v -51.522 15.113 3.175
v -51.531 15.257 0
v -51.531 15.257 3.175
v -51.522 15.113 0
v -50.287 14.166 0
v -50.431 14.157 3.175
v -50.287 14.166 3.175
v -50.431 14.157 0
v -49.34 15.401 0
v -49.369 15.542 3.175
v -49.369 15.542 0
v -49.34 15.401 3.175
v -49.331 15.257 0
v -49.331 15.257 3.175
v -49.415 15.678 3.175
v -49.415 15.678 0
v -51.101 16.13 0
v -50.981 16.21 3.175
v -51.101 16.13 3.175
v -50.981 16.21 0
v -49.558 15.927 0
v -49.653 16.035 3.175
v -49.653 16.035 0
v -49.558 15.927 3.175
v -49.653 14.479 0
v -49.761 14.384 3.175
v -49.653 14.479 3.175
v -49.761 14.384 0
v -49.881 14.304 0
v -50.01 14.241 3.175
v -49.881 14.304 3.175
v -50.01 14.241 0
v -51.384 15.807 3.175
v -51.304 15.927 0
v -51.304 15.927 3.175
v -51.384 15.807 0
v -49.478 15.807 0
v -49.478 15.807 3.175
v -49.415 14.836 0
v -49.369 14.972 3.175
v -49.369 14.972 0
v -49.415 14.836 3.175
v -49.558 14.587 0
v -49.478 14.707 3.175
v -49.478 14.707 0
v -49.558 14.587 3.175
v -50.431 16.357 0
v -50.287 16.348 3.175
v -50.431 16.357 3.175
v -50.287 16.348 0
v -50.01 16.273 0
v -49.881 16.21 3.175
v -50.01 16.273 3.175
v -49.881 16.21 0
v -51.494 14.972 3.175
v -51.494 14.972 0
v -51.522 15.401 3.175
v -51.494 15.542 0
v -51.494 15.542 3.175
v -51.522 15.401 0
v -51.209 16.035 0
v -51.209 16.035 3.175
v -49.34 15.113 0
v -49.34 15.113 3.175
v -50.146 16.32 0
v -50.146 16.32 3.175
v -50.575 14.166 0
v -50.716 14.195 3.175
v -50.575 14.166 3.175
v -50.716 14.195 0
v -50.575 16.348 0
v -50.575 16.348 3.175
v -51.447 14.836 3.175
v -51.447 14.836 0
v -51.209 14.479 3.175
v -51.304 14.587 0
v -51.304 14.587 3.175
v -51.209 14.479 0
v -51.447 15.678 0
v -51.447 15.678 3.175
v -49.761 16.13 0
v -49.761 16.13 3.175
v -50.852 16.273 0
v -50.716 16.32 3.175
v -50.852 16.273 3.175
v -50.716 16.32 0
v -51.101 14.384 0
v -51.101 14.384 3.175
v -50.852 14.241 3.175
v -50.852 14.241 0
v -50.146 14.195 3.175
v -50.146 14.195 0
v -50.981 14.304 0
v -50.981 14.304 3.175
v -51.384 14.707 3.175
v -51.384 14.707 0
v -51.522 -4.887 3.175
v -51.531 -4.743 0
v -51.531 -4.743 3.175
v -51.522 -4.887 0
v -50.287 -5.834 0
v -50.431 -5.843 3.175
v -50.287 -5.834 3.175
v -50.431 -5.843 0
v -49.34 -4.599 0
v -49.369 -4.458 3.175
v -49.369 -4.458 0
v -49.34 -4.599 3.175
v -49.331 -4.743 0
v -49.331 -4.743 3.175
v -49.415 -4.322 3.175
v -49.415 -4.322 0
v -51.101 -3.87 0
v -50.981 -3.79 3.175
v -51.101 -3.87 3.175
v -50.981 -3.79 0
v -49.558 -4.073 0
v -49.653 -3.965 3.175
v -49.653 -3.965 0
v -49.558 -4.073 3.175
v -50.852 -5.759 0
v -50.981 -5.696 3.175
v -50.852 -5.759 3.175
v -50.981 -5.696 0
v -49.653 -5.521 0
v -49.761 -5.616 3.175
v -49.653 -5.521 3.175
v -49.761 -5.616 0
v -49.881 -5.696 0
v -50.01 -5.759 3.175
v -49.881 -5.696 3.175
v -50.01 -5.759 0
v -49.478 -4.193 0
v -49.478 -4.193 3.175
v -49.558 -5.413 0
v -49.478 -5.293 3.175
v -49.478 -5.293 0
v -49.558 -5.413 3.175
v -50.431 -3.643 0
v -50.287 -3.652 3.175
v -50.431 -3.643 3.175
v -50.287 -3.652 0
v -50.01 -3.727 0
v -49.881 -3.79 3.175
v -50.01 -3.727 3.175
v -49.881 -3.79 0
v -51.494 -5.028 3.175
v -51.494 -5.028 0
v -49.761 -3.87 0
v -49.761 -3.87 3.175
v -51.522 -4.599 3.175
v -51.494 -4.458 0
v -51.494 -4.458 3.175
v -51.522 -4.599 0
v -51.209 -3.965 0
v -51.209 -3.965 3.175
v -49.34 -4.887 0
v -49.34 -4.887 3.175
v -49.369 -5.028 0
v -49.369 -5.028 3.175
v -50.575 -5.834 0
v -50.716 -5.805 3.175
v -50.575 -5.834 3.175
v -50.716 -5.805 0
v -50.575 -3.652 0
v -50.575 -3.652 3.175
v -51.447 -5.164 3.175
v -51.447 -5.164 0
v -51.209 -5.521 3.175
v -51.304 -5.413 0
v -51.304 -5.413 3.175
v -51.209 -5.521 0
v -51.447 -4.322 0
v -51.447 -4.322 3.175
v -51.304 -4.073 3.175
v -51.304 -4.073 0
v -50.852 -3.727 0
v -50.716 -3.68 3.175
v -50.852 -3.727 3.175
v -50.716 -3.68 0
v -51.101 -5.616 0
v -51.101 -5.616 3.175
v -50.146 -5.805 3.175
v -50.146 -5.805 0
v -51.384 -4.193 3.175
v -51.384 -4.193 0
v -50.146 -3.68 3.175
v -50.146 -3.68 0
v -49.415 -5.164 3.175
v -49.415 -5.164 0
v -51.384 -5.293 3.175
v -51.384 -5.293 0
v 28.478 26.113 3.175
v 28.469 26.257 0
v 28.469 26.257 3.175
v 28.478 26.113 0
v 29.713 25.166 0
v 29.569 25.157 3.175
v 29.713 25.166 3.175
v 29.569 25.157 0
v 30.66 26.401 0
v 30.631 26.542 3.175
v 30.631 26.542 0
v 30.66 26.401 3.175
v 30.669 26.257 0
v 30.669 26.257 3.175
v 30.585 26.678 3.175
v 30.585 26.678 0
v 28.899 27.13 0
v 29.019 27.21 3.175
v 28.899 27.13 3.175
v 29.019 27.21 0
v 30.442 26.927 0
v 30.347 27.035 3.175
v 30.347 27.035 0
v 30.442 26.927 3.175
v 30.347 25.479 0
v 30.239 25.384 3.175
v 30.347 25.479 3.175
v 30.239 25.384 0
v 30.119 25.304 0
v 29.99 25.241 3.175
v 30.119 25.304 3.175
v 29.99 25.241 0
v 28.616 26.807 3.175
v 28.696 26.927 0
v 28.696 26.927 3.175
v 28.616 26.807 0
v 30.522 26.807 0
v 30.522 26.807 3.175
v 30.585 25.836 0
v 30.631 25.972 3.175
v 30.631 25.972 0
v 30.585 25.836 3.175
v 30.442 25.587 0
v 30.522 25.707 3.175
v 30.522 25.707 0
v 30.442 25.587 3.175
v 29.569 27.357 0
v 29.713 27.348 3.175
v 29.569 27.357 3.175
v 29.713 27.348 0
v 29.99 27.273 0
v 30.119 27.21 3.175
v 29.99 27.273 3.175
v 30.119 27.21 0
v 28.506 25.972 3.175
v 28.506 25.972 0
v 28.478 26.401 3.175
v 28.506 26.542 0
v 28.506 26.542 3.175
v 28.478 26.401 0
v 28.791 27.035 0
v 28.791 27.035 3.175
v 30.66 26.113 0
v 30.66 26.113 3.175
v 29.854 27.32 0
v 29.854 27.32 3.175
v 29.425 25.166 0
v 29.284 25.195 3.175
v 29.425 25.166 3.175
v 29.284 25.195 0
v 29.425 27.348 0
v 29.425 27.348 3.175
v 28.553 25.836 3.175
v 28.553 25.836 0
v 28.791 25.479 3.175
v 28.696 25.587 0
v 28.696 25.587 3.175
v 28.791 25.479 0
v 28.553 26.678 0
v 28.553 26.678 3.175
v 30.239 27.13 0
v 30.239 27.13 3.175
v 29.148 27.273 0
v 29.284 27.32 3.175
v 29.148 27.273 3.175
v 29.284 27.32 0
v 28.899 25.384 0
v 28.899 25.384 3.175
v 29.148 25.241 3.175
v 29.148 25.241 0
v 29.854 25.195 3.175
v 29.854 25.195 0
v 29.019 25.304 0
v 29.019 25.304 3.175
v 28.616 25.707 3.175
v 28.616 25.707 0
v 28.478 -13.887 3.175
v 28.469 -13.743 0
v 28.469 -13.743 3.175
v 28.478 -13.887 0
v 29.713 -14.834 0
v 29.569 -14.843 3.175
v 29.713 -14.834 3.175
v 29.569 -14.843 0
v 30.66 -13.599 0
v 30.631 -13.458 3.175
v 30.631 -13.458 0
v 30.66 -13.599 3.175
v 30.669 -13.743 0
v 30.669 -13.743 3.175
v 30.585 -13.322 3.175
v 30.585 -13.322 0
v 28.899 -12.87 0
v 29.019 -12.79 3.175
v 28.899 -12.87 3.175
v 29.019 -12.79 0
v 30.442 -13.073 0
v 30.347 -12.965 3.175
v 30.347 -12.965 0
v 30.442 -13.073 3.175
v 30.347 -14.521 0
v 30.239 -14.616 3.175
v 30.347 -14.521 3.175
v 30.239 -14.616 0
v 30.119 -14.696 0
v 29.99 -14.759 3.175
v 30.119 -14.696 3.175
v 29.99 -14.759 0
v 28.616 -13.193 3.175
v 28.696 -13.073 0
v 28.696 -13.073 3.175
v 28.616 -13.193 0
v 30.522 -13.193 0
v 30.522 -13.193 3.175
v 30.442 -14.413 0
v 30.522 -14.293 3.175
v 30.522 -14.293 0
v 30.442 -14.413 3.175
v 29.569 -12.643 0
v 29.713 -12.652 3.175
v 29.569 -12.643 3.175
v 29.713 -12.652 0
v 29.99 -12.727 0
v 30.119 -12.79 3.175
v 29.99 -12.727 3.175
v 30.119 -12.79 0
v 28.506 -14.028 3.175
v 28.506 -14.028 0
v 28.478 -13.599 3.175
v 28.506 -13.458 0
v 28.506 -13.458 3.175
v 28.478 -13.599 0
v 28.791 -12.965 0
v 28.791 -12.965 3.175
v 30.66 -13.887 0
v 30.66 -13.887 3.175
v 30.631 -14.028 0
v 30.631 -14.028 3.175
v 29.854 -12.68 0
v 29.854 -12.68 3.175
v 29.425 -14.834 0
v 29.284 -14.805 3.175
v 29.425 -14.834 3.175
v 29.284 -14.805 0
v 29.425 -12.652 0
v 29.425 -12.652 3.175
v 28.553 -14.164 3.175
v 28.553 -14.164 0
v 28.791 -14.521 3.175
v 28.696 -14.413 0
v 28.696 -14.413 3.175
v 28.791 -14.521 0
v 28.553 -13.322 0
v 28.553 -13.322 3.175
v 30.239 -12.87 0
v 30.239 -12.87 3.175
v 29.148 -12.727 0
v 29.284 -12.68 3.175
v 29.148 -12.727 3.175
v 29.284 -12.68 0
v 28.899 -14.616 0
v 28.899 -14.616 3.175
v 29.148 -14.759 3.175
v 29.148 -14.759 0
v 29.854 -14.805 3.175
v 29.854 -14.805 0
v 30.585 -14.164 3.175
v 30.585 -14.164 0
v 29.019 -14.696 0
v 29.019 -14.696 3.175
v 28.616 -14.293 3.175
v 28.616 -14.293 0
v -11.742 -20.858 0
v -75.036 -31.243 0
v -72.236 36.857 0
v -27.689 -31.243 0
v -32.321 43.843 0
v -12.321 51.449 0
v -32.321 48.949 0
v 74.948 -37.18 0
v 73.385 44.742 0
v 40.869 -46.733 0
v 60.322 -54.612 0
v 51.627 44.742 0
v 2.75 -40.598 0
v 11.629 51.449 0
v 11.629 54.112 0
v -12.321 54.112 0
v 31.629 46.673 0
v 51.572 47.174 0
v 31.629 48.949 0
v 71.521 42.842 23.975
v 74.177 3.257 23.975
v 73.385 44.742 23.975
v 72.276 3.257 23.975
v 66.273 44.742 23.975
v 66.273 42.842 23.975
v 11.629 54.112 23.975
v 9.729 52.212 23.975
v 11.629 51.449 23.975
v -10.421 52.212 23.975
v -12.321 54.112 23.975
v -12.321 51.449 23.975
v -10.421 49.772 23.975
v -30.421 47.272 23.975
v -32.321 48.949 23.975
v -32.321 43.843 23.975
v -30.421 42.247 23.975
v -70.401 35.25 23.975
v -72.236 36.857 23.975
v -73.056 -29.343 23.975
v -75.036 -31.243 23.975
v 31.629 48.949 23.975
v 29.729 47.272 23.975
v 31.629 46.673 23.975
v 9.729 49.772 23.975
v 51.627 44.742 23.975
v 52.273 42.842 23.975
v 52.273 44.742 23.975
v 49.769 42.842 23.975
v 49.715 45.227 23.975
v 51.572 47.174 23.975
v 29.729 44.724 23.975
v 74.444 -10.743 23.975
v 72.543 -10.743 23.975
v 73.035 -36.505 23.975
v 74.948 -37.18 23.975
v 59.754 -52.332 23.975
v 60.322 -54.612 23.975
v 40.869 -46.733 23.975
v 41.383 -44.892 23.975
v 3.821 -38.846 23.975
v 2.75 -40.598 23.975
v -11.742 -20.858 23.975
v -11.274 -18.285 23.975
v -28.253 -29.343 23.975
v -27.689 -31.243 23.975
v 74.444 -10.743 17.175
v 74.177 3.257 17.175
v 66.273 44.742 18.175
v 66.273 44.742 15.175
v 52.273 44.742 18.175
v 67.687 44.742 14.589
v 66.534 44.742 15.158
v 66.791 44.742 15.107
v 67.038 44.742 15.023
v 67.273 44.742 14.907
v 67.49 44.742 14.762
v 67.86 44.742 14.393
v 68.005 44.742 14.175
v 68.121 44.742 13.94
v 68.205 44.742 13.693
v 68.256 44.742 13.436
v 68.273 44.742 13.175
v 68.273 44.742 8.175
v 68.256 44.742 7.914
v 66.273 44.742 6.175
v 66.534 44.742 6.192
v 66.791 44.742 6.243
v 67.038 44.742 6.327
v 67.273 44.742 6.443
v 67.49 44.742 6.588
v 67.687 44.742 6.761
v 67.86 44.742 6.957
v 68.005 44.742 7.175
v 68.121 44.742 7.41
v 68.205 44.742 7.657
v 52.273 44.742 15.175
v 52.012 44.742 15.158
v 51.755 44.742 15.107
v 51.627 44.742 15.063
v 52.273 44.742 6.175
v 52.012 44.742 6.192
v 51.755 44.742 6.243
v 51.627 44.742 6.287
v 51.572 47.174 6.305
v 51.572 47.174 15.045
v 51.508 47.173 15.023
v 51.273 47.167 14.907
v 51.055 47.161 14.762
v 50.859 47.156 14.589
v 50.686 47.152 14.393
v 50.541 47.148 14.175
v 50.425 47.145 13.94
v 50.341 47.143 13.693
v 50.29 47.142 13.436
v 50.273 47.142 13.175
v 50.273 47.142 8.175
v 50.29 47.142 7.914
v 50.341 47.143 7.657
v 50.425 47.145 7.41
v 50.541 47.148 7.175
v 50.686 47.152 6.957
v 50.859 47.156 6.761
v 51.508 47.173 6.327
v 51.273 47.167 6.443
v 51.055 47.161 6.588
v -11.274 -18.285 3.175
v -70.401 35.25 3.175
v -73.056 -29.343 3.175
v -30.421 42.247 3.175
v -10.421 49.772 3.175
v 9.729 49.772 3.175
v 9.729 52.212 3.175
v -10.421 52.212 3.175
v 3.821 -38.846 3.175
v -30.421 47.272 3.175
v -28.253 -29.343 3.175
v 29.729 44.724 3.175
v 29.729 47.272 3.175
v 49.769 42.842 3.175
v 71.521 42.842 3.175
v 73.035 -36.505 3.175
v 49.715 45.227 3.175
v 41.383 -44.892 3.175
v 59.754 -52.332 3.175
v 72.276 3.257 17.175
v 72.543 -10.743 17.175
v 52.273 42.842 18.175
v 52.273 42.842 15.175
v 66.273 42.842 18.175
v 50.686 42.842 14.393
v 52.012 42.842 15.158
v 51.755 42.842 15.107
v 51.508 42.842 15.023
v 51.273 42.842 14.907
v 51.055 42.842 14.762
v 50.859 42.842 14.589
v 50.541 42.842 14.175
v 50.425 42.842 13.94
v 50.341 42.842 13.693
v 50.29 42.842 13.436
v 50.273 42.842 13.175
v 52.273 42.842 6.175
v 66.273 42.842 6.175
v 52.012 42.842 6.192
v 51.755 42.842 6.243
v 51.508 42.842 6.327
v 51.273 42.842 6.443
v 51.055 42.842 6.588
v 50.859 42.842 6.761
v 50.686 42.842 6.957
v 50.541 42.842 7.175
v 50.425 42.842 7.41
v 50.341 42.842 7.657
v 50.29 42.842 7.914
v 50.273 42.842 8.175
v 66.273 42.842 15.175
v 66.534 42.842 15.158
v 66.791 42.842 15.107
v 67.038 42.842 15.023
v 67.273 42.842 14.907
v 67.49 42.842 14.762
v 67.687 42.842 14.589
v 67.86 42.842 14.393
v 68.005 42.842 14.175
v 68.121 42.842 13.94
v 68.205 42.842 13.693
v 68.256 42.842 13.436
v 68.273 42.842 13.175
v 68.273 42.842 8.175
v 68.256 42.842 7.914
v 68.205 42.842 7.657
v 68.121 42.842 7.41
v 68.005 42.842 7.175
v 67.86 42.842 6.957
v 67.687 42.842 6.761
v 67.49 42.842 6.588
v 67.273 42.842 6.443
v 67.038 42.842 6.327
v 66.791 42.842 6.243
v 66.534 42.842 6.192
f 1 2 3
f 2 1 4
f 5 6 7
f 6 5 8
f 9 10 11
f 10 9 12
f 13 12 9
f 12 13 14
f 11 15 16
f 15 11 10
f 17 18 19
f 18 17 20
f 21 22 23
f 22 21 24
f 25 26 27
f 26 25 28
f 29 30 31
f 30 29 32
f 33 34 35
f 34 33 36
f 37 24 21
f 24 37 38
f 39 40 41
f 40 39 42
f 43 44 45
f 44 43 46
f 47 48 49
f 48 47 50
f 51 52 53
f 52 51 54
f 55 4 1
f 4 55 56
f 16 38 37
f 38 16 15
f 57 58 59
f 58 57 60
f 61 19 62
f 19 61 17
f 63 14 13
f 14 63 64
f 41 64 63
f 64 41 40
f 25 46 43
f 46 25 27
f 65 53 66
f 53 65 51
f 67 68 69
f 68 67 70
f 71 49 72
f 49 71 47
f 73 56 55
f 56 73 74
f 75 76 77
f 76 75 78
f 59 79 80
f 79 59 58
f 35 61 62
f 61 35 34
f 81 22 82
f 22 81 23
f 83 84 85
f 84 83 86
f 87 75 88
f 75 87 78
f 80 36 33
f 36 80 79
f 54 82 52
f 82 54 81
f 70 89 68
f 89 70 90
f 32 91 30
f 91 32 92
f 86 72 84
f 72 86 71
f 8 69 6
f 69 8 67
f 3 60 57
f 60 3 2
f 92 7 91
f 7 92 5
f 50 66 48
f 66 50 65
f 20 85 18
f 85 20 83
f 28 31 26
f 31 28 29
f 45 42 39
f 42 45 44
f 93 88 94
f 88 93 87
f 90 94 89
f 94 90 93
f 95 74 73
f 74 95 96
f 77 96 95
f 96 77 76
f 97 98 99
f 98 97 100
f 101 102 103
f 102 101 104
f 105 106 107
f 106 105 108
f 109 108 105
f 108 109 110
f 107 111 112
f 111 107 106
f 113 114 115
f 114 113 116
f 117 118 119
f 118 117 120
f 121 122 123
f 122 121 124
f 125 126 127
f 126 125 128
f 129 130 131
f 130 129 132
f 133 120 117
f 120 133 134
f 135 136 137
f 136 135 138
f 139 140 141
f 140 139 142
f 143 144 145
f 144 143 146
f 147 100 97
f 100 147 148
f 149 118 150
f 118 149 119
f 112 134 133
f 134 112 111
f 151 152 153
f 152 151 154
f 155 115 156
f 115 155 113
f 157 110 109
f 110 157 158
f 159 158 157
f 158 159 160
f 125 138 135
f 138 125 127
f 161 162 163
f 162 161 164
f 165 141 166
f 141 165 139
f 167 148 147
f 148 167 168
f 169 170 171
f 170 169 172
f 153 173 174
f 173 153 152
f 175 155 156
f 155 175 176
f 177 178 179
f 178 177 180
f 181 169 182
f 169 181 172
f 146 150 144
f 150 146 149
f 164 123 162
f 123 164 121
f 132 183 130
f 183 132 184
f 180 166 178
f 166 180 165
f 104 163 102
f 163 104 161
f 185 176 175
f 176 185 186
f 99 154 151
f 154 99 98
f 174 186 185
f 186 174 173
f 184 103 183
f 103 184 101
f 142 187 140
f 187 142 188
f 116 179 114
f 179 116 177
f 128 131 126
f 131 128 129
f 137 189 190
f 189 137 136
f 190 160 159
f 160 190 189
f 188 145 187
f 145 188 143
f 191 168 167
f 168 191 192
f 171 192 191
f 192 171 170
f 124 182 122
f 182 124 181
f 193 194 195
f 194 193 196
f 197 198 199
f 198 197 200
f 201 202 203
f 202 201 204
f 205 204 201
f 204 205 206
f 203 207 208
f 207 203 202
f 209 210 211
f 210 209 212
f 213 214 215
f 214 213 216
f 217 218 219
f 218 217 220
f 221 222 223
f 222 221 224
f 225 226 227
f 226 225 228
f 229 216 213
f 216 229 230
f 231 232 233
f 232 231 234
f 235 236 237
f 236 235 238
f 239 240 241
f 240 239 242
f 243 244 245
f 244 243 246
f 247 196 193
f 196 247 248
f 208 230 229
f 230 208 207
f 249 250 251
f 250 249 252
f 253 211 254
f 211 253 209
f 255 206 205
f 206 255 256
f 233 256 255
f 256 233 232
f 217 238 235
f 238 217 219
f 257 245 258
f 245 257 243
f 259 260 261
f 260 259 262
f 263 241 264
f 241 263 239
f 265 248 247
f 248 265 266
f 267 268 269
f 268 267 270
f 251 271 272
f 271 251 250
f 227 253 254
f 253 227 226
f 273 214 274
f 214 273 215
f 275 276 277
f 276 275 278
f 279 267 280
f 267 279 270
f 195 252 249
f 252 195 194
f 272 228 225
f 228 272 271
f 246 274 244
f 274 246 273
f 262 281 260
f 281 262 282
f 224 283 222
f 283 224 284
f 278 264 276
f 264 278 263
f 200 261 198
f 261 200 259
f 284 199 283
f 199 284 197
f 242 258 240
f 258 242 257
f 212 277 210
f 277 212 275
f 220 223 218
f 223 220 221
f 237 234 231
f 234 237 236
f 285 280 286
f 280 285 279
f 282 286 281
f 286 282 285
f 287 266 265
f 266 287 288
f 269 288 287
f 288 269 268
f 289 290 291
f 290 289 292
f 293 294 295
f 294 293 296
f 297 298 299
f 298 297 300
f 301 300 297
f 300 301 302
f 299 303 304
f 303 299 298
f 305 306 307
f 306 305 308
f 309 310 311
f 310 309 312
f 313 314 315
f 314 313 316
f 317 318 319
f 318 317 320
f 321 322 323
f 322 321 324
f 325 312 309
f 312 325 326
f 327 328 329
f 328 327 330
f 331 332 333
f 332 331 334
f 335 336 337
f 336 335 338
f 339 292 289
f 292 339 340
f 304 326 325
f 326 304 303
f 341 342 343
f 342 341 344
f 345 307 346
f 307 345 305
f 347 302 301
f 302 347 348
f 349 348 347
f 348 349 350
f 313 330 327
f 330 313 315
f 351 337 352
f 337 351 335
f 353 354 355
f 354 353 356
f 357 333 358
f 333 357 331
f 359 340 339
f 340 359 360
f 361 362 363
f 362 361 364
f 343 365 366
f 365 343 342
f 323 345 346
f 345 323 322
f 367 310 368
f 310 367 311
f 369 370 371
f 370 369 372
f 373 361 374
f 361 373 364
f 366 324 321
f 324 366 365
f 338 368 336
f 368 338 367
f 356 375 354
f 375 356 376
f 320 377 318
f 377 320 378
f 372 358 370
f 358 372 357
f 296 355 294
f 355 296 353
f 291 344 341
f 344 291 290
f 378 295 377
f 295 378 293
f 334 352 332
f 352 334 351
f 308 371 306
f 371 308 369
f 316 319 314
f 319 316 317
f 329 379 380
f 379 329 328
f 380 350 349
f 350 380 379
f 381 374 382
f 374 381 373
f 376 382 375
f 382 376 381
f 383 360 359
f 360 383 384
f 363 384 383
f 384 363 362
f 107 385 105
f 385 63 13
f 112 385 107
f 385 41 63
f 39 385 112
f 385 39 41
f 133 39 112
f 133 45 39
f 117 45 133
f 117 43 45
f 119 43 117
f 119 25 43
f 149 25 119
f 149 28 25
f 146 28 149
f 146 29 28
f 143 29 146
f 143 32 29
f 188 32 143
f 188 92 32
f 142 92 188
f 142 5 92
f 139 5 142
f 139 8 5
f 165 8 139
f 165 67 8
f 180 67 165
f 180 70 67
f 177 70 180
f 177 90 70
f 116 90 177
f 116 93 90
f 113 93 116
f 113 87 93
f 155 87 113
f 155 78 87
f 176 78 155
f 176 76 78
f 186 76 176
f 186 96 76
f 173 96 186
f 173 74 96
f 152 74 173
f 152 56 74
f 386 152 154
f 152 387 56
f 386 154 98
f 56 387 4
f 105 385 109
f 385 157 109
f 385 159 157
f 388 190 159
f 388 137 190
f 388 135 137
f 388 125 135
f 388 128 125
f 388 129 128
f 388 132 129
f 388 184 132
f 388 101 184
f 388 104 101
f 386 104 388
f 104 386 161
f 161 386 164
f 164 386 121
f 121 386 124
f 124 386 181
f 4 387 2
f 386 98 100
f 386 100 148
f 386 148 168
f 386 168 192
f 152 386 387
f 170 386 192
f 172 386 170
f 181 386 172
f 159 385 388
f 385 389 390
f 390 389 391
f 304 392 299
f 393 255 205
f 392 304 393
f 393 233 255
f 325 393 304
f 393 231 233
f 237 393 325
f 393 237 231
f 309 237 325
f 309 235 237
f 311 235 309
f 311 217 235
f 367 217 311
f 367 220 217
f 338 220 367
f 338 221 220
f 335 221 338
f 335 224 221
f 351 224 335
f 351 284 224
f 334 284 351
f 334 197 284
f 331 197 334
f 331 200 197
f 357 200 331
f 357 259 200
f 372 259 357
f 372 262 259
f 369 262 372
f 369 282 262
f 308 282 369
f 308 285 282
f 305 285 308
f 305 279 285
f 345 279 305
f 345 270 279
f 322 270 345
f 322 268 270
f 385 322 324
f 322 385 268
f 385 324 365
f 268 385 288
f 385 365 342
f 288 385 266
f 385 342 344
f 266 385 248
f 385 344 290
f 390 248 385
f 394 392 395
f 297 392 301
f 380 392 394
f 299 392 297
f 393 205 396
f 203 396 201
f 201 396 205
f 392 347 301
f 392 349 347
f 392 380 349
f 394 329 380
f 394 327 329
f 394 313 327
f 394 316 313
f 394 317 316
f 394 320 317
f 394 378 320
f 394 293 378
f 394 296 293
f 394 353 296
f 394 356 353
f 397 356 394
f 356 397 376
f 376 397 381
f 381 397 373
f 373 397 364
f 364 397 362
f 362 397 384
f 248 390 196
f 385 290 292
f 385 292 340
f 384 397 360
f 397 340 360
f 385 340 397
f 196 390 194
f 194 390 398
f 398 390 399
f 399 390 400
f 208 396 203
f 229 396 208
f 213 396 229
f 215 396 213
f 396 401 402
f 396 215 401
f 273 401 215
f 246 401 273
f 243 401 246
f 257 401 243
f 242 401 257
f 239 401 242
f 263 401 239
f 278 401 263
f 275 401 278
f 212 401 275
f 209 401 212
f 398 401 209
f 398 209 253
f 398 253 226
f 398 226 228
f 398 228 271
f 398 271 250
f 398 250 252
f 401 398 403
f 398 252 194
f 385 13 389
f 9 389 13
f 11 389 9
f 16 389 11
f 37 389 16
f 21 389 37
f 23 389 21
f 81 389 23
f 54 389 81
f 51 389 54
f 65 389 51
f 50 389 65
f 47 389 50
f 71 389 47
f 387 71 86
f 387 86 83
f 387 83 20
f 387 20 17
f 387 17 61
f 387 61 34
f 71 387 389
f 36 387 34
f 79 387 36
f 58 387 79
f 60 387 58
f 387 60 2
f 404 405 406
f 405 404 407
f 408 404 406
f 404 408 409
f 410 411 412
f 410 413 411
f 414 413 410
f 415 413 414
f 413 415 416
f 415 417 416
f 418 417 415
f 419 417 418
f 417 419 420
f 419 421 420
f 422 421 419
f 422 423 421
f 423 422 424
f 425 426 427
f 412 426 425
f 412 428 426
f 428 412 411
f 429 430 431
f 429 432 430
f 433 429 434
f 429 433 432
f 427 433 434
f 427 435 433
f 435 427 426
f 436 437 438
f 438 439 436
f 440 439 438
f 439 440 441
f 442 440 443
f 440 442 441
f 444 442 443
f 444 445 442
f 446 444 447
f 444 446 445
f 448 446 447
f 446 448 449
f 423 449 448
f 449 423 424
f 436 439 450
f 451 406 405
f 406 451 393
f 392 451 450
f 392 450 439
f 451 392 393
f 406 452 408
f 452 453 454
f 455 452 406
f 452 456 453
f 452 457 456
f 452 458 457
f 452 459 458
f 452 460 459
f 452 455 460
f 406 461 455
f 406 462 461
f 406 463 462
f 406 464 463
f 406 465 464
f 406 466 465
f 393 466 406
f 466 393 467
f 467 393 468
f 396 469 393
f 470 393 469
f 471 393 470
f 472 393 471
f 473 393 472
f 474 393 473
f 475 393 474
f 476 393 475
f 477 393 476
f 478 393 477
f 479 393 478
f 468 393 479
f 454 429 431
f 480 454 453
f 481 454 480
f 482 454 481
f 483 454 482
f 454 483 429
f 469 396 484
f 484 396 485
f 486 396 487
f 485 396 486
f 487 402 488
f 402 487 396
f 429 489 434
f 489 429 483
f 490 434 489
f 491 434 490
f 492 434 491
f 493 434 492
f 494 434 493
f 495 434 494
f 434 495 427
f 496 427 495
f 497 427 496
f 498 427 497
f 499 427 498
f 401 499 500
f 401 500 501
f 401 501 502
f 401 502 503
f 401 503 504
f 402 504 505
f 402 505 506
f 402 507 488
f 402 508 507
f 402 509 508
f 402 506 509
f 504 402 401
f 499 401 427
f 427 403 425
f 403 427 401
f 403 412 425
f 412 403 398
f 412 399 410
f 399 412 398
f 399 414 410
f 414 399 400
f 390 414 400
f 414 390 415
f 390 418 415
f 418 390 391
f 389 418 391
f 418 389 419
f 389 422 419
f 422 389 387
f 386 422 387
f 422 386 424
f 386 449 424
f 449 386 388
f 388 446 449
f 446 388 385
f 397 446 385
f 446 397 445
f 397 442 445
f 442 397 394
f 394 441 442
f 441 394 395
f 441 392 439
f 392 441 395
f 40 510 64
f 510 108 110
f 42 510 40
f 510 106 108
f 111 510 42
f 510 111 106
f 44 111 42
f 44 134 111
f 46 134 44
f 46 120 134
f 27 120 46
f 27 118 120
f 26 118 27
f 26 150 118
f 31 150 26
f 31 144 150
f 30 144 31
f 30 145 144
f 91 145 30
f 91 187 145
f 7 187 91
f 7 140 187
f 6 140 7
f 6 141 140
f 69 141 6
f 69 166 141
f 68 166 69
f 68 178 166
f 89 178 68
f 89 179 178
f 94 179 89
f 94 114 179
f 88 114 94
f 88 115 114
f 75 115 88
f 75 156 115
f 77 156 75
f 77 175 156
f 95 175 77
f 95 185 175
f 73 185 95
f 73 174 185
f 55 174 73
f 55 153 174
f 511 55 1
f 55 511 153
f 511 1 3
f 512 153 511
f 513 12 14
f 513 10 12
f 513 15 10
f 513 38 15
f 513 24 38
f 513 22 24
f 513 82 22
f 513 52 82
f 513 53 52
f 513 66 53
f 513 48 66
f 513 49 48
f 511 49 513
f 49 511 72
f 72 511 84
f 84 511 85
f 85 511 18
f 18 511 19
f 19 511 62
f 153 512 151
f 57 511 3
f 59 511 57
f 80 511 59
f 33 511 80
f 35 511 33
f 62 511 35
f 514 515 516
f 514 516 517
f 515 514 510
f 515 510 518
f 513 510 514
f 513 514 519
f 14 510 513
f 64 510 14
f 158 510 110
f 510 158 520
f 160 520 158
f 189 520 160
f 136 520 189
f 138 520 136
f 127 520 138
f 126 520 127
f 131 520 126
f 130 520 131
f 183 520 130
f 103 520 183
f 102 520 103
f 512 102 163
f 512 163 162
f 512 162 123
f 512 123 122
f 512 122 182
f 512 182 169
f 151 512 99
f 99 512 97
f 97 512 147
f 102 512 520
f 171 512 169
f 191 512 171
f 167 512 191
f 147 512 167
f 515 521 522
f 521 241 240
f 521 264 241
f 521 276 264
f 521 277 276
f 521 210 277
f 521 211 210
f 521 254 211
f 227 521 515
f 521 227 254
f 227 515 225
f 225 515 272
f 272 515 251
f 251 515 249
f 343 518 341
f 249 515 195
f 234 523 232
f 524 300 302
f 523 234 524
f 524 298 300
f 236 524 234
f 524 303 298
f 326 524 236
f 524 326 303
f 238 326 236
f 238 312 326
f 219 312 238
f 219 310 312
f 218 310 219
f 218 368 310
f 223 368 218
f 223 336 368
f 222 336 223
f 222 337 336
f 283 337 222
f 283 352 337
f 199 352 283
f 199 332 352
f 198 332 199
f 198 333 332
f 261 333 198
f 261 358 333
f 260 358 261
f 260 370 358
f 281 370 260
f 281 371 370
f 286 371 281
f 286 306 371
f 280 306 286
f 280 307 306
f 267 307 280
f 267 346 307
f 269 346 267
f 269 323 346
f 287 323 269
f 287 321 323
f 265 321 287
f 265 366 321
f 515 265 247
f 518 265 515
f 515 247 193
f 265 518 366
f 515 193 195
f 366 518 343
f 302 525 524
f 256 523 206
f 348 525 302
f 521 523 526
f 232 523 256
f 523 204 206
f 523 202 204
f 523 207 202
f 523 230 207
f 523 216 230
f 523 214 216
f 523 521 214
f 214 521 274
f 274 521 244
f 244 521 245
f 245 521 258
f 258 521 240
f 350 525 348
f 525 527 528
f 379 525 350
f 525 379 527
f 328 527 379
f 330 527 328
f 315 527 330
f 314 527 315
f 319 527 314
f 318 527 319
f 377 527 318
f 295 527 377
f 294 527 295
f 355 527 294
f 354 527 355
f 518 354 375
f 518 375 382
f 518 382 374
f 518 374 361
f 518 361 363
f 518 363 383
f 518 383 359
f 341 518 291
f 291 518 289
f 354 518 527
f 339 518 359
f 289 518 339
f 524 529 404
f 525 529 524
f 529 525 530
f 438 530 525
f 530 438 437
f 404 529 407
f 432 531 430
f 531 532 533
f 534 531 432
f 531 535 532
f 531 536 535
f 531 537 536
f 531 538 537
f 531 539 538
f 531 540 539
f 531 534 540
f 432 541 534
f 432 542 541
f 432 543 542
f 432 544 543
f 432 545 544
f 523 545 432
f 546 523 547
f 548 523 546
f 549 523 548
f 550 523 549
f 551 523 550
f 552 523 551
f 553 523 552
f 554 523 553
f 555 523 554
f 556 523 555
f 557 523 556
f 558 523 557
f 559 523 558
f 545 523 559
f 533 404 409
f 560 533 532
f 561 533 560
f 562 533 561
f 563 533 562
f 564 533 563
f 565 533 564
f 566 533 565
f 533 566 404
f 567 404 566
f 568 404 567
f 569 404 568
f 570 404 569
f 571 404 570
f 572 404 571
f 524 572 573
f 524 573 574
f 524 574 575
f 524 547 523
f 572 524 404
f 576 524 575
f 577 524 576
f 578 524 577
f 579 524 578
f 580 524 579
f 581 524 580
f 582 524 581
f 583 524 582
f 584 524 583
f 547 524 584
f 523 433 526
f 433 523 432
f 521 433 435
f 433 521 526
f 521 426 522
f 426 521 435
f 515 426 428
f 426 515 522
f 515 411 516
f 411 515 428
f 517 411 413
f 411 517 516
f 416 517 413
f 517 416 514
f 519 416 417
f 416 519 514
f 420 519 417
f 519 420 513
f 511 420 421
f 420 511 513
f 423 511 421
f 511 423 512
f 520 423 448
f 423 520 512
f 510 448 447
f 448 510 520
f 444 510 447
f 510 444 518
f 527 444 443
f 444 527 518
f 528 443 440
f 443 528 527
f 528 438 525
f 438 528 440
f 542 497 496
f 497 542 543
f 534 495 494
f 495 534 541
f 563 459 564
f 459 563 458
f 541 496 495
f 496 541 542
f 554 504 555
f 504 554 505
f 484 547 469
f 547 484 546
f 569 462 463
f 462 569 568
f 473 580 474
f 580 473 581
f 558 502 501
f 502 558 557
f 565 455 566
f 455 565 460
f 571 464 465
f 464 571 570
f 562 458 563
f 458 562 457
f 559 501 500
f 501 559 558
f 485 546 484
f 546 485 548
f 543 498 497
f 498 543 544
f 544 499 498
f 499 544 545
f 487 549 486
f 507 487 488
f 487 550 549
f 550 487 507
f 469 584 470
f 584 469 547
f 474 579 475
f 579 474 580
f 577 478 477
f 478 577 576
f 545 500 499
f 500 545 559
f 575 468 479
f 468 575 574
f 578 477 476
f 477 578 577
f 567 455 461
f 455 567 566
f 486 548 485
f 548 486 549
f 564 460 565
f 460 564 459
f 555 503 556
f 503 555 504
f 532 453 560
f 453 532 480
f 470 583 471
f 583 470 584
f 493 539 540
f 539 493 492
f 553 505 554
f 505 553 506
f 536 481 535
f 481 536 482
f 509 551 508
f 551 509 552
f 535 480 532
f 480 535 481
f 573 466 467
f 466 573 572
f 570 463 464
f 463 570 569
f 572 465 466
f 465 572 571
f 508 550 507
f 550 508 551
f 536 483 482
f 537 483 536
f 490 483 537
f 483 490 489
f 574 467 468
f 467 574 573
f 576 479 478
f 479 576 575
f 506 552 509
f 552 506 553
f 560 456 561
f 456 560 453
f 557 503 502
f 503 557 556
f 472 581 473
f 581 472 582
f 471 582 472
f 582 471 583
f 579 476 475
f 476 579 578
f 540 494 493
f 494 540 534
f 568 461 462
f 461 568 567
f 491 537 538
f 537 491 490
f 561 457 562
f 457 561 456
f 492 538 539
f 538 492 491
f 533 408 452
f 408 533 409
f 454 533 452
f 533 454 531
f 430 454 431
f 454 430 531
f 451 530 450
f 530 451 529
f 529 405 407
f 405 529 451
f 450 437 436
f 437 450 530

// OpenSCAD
// file: geometry.scad
left_geometry = [[[-72.4310476, -28.742944300000005], [-69.8210476, 34.742055699999995], [-29.821047599999986, 41.74305569999999], [-29.821047599999986, 46.742055699999995], [-9.821047599999986, 49.242055699999995], [-9.821047599999986, 51.6120557], [9.128952400000003, 51.6120557], [9.128952400000003, 49.242055699999995], [29.128952400000003, 46.742055699999995], [29.128952400000003, 44.1090557], [49.1289524, 44.6120557], [49.1819524, 42.242055699999995], [70.9319524, 42.242055699999995], [72.4310476, -36.29116690000001], [59.57529539999999, -51.61205570000001], [41.5456772, -44.3100719], [4.158952400000004, -38.2929443], [-11.126047599999993, -17.47294430000001], [-28.4310476, -28.742944300000005]], [[-60.4310476, -14.742944300000005, 0.0], [-60.4310476, 5.257055699999995, 0.0], [-60.4310476, 25.257055699999995, 0.0], [-40.4310476, -14.742944300000005, 0.0], [-40.4310476, 5.257055699999995, 0.0], [-40.4310476, 25.257055699999995, 0.0], [-20.4310476, -2.742944300000005, 0.0], [-20.4310476, 17.257055699999995, 0.0], [-20.4310476, 37.257055699999995, 0.0], [-0.4310475999999994, 2.257055699999995, 0.0], [-0.4310475999999994, 22.257055699999995, 0.0], [-0.4310475999999994, 42.257055699999995, 0.0], [19.5689524, -2.742944300000005, 0.0], [19.5689524, 17.257055699999995, 0.0], [19.5689524, 37.257055699999995, 0.0], [39.5689524, -4.742944300000005, 0.0], [39.5689524, 15.257055699999995, 0.0], [39.5689524, 35.257055699999995, 0.0], [13.5689524, -28.742944300000005, 0.0], [35.5689524, -31.492944300000005, -20.0], [58.34272709999999, -37.523735200000004, 50.0]], [[-50.4310476, 15.257055699999995], [-50.4310476, -4.742944300000005], [29.5689524, 26.257055699999995], [29.5689524, -13.742944300000005]], [59.27295240000001, 24.387055699999998], [59.27295240000001, 39.9570557], [68.8189524, -3.742944300000005], [-72.4310476, -51.61205570000001, 72.4310476, 51.6120557], [-8.4310476, 17.757055699999995], 2.2];
right_geometry = [[[72.4310476, -28.742944300000005], [69.82104759999999, 34.742055699999995], [29.821047599999986, 41.74305569999999], [29.821047599999986, 46.742055699999995], [9.821047599999986, 49.242055699999995], [9.821047599999986, 51.6120557], [-9.128952400000003, 51.6120557], [-9.128952400000003, 49.242055699999995], [-29.128952400000003, 46.742055699999995], [-29.128952400000003, 44.1090557], [-49.1289524, 44.6120557], [-49.1819524, 42.242055699999995], [-70.9319524, 42.242055699999995], [-72.4310476, -36.29116690000001], [-59.57529539999999, -51.61205570000001], [-41.5456772, -44.3100719], [-4.158952400000004, -38.2929443], [11.126047599999993, -17.47294430000001], [28.4310476, -28.742944300000005]], [[60.4310476, -14.742944300000005, 0.0], [60.4310476, 5.257055699999995, 0.0], [60.4310476, 25.257055699999995, 0.0], [40.4310476, -14.742944300000005, 0.0], [40.4310476, 5.257055699999995, 0.0], [40.4310476, 25.257055699999995, 0.0], [20.4310476, -2.742944300000005, 0.0], [20.4310476, 17.257055699999995, 0.0], [20.4310476, 37.257055699999995, 0.0], [0.4310475999999994, 2.257055699999995, 0.0], [0.4310475999999994, 22.257055699999995, 0.0], [0.4310475999999994, 42.257055699999995, 0.0], [-19.5689524, -2.742944300000005, 0.0], [-19.5689524, 17.257055699999995, 0.0], [-19.5689524, 37.257055699999995, 0.0], [-39.5689524, -4.742944300000005, 0.0], [-39.5689524, 15.257055699999995, 0.0], [-39.5689524, 35.257055699999995, 0.0], [-13.5689524, -28.742944300000005, 0.0], [-35.5689524, -31.492944300000005, 20.0], [-58.34272709999999, -37.523735200000004, -50.0]], [[50.4310476, 15.257055699999995], [50.4310476, -4.742944300000005], [-29.5689524, 26.257055699999995], [-29.5689524, -13.742944300000005]], [-59.27295240000001, 24.387055699999998], [-59.27295240000001, 39.9570557], [-68.8189524, -3.742944300000005], [-72.4310476, -51.61205570000001, 72.4310476, 51.6120557], [8.4310476, 17.757055699999995], 2.2];
// file: parameters.scad
bottom_thickness = 3.175;
plate_thickness = 1.6002;
standoff_height = 15;
standoff_shim = 1;
pcb_thickness = 1.6;
plate_to_pcb_gap = 3.5;
outline_expansion = 2.5;
bolt_diameter = 2.2;
switch_cutout = 14;
damping_thickness = 1.6002;
damping_bolt_diameter = 5.2;
standoff_diameter = 4.7;
standoff_across_flats = 4;
upper_spacer_height = 3;
upper_spacer_shim = 0.5;
upper_spacer_diameter = 4;
washer_diameter = 5.5;
top_screw_length = 12;
bottom_screw_length = 6;
screw_head_washer = 0.5;
standoff_thread_depth = 5;
controller_gap = 8;
controller_board_thickness = 1.6;
controller_component_height = 3;
controller_width = 18;
controller_length = 34;
// main file
side = "left";
$fn = 48;
include <parameters.scad>
include <geometry.scad>

data = side == "left" ? left_geometry : right_geometry;
outline = data[0];
bolts = data[2];
controller = data[3];
reset = data[4];
power = data[5];
pcb_z = bottom_thickness + standoff_height + standoff_shim;
plate_z = pcb_z + pcb_thickness + plate_to_pcb_gap;
tray_height = plate_z - 0.3;
pcb_clearance = 0.6;

module usb_opening() {
    translate([controller[0],controller[1]+12,pcb_z-controller_gap-0.5])
        rotate([-90,0,0]) linear_extrude(40)
            hull() for (x=[-7,7],y=[-2.5,2.5])
                translate([x,y]) circle(r=2);
}

difference() {
    linear_extrude(tray_height) offset(delta=outline_expansion) polygon(outline);
    translate([0,0,bottom_thickness]) linear_extrude(tray_height)
        offset(delta=pcb_clearance) polygon(outline);
    for (p=bolts) translate([p[0],p[1],-0.1])
        cylinder(d=bolt_diameter,h=bottom_thickness+0.2);
    usb_opening();
    translate([reset[0]-7,reset[1]-4,pcb_z-1]) cube([14,40,20]);
    translate([power[0]+(side=="left"?-4:-26),power[1]-7,pcb_z-2])
        cube([30,14,20]);
}
